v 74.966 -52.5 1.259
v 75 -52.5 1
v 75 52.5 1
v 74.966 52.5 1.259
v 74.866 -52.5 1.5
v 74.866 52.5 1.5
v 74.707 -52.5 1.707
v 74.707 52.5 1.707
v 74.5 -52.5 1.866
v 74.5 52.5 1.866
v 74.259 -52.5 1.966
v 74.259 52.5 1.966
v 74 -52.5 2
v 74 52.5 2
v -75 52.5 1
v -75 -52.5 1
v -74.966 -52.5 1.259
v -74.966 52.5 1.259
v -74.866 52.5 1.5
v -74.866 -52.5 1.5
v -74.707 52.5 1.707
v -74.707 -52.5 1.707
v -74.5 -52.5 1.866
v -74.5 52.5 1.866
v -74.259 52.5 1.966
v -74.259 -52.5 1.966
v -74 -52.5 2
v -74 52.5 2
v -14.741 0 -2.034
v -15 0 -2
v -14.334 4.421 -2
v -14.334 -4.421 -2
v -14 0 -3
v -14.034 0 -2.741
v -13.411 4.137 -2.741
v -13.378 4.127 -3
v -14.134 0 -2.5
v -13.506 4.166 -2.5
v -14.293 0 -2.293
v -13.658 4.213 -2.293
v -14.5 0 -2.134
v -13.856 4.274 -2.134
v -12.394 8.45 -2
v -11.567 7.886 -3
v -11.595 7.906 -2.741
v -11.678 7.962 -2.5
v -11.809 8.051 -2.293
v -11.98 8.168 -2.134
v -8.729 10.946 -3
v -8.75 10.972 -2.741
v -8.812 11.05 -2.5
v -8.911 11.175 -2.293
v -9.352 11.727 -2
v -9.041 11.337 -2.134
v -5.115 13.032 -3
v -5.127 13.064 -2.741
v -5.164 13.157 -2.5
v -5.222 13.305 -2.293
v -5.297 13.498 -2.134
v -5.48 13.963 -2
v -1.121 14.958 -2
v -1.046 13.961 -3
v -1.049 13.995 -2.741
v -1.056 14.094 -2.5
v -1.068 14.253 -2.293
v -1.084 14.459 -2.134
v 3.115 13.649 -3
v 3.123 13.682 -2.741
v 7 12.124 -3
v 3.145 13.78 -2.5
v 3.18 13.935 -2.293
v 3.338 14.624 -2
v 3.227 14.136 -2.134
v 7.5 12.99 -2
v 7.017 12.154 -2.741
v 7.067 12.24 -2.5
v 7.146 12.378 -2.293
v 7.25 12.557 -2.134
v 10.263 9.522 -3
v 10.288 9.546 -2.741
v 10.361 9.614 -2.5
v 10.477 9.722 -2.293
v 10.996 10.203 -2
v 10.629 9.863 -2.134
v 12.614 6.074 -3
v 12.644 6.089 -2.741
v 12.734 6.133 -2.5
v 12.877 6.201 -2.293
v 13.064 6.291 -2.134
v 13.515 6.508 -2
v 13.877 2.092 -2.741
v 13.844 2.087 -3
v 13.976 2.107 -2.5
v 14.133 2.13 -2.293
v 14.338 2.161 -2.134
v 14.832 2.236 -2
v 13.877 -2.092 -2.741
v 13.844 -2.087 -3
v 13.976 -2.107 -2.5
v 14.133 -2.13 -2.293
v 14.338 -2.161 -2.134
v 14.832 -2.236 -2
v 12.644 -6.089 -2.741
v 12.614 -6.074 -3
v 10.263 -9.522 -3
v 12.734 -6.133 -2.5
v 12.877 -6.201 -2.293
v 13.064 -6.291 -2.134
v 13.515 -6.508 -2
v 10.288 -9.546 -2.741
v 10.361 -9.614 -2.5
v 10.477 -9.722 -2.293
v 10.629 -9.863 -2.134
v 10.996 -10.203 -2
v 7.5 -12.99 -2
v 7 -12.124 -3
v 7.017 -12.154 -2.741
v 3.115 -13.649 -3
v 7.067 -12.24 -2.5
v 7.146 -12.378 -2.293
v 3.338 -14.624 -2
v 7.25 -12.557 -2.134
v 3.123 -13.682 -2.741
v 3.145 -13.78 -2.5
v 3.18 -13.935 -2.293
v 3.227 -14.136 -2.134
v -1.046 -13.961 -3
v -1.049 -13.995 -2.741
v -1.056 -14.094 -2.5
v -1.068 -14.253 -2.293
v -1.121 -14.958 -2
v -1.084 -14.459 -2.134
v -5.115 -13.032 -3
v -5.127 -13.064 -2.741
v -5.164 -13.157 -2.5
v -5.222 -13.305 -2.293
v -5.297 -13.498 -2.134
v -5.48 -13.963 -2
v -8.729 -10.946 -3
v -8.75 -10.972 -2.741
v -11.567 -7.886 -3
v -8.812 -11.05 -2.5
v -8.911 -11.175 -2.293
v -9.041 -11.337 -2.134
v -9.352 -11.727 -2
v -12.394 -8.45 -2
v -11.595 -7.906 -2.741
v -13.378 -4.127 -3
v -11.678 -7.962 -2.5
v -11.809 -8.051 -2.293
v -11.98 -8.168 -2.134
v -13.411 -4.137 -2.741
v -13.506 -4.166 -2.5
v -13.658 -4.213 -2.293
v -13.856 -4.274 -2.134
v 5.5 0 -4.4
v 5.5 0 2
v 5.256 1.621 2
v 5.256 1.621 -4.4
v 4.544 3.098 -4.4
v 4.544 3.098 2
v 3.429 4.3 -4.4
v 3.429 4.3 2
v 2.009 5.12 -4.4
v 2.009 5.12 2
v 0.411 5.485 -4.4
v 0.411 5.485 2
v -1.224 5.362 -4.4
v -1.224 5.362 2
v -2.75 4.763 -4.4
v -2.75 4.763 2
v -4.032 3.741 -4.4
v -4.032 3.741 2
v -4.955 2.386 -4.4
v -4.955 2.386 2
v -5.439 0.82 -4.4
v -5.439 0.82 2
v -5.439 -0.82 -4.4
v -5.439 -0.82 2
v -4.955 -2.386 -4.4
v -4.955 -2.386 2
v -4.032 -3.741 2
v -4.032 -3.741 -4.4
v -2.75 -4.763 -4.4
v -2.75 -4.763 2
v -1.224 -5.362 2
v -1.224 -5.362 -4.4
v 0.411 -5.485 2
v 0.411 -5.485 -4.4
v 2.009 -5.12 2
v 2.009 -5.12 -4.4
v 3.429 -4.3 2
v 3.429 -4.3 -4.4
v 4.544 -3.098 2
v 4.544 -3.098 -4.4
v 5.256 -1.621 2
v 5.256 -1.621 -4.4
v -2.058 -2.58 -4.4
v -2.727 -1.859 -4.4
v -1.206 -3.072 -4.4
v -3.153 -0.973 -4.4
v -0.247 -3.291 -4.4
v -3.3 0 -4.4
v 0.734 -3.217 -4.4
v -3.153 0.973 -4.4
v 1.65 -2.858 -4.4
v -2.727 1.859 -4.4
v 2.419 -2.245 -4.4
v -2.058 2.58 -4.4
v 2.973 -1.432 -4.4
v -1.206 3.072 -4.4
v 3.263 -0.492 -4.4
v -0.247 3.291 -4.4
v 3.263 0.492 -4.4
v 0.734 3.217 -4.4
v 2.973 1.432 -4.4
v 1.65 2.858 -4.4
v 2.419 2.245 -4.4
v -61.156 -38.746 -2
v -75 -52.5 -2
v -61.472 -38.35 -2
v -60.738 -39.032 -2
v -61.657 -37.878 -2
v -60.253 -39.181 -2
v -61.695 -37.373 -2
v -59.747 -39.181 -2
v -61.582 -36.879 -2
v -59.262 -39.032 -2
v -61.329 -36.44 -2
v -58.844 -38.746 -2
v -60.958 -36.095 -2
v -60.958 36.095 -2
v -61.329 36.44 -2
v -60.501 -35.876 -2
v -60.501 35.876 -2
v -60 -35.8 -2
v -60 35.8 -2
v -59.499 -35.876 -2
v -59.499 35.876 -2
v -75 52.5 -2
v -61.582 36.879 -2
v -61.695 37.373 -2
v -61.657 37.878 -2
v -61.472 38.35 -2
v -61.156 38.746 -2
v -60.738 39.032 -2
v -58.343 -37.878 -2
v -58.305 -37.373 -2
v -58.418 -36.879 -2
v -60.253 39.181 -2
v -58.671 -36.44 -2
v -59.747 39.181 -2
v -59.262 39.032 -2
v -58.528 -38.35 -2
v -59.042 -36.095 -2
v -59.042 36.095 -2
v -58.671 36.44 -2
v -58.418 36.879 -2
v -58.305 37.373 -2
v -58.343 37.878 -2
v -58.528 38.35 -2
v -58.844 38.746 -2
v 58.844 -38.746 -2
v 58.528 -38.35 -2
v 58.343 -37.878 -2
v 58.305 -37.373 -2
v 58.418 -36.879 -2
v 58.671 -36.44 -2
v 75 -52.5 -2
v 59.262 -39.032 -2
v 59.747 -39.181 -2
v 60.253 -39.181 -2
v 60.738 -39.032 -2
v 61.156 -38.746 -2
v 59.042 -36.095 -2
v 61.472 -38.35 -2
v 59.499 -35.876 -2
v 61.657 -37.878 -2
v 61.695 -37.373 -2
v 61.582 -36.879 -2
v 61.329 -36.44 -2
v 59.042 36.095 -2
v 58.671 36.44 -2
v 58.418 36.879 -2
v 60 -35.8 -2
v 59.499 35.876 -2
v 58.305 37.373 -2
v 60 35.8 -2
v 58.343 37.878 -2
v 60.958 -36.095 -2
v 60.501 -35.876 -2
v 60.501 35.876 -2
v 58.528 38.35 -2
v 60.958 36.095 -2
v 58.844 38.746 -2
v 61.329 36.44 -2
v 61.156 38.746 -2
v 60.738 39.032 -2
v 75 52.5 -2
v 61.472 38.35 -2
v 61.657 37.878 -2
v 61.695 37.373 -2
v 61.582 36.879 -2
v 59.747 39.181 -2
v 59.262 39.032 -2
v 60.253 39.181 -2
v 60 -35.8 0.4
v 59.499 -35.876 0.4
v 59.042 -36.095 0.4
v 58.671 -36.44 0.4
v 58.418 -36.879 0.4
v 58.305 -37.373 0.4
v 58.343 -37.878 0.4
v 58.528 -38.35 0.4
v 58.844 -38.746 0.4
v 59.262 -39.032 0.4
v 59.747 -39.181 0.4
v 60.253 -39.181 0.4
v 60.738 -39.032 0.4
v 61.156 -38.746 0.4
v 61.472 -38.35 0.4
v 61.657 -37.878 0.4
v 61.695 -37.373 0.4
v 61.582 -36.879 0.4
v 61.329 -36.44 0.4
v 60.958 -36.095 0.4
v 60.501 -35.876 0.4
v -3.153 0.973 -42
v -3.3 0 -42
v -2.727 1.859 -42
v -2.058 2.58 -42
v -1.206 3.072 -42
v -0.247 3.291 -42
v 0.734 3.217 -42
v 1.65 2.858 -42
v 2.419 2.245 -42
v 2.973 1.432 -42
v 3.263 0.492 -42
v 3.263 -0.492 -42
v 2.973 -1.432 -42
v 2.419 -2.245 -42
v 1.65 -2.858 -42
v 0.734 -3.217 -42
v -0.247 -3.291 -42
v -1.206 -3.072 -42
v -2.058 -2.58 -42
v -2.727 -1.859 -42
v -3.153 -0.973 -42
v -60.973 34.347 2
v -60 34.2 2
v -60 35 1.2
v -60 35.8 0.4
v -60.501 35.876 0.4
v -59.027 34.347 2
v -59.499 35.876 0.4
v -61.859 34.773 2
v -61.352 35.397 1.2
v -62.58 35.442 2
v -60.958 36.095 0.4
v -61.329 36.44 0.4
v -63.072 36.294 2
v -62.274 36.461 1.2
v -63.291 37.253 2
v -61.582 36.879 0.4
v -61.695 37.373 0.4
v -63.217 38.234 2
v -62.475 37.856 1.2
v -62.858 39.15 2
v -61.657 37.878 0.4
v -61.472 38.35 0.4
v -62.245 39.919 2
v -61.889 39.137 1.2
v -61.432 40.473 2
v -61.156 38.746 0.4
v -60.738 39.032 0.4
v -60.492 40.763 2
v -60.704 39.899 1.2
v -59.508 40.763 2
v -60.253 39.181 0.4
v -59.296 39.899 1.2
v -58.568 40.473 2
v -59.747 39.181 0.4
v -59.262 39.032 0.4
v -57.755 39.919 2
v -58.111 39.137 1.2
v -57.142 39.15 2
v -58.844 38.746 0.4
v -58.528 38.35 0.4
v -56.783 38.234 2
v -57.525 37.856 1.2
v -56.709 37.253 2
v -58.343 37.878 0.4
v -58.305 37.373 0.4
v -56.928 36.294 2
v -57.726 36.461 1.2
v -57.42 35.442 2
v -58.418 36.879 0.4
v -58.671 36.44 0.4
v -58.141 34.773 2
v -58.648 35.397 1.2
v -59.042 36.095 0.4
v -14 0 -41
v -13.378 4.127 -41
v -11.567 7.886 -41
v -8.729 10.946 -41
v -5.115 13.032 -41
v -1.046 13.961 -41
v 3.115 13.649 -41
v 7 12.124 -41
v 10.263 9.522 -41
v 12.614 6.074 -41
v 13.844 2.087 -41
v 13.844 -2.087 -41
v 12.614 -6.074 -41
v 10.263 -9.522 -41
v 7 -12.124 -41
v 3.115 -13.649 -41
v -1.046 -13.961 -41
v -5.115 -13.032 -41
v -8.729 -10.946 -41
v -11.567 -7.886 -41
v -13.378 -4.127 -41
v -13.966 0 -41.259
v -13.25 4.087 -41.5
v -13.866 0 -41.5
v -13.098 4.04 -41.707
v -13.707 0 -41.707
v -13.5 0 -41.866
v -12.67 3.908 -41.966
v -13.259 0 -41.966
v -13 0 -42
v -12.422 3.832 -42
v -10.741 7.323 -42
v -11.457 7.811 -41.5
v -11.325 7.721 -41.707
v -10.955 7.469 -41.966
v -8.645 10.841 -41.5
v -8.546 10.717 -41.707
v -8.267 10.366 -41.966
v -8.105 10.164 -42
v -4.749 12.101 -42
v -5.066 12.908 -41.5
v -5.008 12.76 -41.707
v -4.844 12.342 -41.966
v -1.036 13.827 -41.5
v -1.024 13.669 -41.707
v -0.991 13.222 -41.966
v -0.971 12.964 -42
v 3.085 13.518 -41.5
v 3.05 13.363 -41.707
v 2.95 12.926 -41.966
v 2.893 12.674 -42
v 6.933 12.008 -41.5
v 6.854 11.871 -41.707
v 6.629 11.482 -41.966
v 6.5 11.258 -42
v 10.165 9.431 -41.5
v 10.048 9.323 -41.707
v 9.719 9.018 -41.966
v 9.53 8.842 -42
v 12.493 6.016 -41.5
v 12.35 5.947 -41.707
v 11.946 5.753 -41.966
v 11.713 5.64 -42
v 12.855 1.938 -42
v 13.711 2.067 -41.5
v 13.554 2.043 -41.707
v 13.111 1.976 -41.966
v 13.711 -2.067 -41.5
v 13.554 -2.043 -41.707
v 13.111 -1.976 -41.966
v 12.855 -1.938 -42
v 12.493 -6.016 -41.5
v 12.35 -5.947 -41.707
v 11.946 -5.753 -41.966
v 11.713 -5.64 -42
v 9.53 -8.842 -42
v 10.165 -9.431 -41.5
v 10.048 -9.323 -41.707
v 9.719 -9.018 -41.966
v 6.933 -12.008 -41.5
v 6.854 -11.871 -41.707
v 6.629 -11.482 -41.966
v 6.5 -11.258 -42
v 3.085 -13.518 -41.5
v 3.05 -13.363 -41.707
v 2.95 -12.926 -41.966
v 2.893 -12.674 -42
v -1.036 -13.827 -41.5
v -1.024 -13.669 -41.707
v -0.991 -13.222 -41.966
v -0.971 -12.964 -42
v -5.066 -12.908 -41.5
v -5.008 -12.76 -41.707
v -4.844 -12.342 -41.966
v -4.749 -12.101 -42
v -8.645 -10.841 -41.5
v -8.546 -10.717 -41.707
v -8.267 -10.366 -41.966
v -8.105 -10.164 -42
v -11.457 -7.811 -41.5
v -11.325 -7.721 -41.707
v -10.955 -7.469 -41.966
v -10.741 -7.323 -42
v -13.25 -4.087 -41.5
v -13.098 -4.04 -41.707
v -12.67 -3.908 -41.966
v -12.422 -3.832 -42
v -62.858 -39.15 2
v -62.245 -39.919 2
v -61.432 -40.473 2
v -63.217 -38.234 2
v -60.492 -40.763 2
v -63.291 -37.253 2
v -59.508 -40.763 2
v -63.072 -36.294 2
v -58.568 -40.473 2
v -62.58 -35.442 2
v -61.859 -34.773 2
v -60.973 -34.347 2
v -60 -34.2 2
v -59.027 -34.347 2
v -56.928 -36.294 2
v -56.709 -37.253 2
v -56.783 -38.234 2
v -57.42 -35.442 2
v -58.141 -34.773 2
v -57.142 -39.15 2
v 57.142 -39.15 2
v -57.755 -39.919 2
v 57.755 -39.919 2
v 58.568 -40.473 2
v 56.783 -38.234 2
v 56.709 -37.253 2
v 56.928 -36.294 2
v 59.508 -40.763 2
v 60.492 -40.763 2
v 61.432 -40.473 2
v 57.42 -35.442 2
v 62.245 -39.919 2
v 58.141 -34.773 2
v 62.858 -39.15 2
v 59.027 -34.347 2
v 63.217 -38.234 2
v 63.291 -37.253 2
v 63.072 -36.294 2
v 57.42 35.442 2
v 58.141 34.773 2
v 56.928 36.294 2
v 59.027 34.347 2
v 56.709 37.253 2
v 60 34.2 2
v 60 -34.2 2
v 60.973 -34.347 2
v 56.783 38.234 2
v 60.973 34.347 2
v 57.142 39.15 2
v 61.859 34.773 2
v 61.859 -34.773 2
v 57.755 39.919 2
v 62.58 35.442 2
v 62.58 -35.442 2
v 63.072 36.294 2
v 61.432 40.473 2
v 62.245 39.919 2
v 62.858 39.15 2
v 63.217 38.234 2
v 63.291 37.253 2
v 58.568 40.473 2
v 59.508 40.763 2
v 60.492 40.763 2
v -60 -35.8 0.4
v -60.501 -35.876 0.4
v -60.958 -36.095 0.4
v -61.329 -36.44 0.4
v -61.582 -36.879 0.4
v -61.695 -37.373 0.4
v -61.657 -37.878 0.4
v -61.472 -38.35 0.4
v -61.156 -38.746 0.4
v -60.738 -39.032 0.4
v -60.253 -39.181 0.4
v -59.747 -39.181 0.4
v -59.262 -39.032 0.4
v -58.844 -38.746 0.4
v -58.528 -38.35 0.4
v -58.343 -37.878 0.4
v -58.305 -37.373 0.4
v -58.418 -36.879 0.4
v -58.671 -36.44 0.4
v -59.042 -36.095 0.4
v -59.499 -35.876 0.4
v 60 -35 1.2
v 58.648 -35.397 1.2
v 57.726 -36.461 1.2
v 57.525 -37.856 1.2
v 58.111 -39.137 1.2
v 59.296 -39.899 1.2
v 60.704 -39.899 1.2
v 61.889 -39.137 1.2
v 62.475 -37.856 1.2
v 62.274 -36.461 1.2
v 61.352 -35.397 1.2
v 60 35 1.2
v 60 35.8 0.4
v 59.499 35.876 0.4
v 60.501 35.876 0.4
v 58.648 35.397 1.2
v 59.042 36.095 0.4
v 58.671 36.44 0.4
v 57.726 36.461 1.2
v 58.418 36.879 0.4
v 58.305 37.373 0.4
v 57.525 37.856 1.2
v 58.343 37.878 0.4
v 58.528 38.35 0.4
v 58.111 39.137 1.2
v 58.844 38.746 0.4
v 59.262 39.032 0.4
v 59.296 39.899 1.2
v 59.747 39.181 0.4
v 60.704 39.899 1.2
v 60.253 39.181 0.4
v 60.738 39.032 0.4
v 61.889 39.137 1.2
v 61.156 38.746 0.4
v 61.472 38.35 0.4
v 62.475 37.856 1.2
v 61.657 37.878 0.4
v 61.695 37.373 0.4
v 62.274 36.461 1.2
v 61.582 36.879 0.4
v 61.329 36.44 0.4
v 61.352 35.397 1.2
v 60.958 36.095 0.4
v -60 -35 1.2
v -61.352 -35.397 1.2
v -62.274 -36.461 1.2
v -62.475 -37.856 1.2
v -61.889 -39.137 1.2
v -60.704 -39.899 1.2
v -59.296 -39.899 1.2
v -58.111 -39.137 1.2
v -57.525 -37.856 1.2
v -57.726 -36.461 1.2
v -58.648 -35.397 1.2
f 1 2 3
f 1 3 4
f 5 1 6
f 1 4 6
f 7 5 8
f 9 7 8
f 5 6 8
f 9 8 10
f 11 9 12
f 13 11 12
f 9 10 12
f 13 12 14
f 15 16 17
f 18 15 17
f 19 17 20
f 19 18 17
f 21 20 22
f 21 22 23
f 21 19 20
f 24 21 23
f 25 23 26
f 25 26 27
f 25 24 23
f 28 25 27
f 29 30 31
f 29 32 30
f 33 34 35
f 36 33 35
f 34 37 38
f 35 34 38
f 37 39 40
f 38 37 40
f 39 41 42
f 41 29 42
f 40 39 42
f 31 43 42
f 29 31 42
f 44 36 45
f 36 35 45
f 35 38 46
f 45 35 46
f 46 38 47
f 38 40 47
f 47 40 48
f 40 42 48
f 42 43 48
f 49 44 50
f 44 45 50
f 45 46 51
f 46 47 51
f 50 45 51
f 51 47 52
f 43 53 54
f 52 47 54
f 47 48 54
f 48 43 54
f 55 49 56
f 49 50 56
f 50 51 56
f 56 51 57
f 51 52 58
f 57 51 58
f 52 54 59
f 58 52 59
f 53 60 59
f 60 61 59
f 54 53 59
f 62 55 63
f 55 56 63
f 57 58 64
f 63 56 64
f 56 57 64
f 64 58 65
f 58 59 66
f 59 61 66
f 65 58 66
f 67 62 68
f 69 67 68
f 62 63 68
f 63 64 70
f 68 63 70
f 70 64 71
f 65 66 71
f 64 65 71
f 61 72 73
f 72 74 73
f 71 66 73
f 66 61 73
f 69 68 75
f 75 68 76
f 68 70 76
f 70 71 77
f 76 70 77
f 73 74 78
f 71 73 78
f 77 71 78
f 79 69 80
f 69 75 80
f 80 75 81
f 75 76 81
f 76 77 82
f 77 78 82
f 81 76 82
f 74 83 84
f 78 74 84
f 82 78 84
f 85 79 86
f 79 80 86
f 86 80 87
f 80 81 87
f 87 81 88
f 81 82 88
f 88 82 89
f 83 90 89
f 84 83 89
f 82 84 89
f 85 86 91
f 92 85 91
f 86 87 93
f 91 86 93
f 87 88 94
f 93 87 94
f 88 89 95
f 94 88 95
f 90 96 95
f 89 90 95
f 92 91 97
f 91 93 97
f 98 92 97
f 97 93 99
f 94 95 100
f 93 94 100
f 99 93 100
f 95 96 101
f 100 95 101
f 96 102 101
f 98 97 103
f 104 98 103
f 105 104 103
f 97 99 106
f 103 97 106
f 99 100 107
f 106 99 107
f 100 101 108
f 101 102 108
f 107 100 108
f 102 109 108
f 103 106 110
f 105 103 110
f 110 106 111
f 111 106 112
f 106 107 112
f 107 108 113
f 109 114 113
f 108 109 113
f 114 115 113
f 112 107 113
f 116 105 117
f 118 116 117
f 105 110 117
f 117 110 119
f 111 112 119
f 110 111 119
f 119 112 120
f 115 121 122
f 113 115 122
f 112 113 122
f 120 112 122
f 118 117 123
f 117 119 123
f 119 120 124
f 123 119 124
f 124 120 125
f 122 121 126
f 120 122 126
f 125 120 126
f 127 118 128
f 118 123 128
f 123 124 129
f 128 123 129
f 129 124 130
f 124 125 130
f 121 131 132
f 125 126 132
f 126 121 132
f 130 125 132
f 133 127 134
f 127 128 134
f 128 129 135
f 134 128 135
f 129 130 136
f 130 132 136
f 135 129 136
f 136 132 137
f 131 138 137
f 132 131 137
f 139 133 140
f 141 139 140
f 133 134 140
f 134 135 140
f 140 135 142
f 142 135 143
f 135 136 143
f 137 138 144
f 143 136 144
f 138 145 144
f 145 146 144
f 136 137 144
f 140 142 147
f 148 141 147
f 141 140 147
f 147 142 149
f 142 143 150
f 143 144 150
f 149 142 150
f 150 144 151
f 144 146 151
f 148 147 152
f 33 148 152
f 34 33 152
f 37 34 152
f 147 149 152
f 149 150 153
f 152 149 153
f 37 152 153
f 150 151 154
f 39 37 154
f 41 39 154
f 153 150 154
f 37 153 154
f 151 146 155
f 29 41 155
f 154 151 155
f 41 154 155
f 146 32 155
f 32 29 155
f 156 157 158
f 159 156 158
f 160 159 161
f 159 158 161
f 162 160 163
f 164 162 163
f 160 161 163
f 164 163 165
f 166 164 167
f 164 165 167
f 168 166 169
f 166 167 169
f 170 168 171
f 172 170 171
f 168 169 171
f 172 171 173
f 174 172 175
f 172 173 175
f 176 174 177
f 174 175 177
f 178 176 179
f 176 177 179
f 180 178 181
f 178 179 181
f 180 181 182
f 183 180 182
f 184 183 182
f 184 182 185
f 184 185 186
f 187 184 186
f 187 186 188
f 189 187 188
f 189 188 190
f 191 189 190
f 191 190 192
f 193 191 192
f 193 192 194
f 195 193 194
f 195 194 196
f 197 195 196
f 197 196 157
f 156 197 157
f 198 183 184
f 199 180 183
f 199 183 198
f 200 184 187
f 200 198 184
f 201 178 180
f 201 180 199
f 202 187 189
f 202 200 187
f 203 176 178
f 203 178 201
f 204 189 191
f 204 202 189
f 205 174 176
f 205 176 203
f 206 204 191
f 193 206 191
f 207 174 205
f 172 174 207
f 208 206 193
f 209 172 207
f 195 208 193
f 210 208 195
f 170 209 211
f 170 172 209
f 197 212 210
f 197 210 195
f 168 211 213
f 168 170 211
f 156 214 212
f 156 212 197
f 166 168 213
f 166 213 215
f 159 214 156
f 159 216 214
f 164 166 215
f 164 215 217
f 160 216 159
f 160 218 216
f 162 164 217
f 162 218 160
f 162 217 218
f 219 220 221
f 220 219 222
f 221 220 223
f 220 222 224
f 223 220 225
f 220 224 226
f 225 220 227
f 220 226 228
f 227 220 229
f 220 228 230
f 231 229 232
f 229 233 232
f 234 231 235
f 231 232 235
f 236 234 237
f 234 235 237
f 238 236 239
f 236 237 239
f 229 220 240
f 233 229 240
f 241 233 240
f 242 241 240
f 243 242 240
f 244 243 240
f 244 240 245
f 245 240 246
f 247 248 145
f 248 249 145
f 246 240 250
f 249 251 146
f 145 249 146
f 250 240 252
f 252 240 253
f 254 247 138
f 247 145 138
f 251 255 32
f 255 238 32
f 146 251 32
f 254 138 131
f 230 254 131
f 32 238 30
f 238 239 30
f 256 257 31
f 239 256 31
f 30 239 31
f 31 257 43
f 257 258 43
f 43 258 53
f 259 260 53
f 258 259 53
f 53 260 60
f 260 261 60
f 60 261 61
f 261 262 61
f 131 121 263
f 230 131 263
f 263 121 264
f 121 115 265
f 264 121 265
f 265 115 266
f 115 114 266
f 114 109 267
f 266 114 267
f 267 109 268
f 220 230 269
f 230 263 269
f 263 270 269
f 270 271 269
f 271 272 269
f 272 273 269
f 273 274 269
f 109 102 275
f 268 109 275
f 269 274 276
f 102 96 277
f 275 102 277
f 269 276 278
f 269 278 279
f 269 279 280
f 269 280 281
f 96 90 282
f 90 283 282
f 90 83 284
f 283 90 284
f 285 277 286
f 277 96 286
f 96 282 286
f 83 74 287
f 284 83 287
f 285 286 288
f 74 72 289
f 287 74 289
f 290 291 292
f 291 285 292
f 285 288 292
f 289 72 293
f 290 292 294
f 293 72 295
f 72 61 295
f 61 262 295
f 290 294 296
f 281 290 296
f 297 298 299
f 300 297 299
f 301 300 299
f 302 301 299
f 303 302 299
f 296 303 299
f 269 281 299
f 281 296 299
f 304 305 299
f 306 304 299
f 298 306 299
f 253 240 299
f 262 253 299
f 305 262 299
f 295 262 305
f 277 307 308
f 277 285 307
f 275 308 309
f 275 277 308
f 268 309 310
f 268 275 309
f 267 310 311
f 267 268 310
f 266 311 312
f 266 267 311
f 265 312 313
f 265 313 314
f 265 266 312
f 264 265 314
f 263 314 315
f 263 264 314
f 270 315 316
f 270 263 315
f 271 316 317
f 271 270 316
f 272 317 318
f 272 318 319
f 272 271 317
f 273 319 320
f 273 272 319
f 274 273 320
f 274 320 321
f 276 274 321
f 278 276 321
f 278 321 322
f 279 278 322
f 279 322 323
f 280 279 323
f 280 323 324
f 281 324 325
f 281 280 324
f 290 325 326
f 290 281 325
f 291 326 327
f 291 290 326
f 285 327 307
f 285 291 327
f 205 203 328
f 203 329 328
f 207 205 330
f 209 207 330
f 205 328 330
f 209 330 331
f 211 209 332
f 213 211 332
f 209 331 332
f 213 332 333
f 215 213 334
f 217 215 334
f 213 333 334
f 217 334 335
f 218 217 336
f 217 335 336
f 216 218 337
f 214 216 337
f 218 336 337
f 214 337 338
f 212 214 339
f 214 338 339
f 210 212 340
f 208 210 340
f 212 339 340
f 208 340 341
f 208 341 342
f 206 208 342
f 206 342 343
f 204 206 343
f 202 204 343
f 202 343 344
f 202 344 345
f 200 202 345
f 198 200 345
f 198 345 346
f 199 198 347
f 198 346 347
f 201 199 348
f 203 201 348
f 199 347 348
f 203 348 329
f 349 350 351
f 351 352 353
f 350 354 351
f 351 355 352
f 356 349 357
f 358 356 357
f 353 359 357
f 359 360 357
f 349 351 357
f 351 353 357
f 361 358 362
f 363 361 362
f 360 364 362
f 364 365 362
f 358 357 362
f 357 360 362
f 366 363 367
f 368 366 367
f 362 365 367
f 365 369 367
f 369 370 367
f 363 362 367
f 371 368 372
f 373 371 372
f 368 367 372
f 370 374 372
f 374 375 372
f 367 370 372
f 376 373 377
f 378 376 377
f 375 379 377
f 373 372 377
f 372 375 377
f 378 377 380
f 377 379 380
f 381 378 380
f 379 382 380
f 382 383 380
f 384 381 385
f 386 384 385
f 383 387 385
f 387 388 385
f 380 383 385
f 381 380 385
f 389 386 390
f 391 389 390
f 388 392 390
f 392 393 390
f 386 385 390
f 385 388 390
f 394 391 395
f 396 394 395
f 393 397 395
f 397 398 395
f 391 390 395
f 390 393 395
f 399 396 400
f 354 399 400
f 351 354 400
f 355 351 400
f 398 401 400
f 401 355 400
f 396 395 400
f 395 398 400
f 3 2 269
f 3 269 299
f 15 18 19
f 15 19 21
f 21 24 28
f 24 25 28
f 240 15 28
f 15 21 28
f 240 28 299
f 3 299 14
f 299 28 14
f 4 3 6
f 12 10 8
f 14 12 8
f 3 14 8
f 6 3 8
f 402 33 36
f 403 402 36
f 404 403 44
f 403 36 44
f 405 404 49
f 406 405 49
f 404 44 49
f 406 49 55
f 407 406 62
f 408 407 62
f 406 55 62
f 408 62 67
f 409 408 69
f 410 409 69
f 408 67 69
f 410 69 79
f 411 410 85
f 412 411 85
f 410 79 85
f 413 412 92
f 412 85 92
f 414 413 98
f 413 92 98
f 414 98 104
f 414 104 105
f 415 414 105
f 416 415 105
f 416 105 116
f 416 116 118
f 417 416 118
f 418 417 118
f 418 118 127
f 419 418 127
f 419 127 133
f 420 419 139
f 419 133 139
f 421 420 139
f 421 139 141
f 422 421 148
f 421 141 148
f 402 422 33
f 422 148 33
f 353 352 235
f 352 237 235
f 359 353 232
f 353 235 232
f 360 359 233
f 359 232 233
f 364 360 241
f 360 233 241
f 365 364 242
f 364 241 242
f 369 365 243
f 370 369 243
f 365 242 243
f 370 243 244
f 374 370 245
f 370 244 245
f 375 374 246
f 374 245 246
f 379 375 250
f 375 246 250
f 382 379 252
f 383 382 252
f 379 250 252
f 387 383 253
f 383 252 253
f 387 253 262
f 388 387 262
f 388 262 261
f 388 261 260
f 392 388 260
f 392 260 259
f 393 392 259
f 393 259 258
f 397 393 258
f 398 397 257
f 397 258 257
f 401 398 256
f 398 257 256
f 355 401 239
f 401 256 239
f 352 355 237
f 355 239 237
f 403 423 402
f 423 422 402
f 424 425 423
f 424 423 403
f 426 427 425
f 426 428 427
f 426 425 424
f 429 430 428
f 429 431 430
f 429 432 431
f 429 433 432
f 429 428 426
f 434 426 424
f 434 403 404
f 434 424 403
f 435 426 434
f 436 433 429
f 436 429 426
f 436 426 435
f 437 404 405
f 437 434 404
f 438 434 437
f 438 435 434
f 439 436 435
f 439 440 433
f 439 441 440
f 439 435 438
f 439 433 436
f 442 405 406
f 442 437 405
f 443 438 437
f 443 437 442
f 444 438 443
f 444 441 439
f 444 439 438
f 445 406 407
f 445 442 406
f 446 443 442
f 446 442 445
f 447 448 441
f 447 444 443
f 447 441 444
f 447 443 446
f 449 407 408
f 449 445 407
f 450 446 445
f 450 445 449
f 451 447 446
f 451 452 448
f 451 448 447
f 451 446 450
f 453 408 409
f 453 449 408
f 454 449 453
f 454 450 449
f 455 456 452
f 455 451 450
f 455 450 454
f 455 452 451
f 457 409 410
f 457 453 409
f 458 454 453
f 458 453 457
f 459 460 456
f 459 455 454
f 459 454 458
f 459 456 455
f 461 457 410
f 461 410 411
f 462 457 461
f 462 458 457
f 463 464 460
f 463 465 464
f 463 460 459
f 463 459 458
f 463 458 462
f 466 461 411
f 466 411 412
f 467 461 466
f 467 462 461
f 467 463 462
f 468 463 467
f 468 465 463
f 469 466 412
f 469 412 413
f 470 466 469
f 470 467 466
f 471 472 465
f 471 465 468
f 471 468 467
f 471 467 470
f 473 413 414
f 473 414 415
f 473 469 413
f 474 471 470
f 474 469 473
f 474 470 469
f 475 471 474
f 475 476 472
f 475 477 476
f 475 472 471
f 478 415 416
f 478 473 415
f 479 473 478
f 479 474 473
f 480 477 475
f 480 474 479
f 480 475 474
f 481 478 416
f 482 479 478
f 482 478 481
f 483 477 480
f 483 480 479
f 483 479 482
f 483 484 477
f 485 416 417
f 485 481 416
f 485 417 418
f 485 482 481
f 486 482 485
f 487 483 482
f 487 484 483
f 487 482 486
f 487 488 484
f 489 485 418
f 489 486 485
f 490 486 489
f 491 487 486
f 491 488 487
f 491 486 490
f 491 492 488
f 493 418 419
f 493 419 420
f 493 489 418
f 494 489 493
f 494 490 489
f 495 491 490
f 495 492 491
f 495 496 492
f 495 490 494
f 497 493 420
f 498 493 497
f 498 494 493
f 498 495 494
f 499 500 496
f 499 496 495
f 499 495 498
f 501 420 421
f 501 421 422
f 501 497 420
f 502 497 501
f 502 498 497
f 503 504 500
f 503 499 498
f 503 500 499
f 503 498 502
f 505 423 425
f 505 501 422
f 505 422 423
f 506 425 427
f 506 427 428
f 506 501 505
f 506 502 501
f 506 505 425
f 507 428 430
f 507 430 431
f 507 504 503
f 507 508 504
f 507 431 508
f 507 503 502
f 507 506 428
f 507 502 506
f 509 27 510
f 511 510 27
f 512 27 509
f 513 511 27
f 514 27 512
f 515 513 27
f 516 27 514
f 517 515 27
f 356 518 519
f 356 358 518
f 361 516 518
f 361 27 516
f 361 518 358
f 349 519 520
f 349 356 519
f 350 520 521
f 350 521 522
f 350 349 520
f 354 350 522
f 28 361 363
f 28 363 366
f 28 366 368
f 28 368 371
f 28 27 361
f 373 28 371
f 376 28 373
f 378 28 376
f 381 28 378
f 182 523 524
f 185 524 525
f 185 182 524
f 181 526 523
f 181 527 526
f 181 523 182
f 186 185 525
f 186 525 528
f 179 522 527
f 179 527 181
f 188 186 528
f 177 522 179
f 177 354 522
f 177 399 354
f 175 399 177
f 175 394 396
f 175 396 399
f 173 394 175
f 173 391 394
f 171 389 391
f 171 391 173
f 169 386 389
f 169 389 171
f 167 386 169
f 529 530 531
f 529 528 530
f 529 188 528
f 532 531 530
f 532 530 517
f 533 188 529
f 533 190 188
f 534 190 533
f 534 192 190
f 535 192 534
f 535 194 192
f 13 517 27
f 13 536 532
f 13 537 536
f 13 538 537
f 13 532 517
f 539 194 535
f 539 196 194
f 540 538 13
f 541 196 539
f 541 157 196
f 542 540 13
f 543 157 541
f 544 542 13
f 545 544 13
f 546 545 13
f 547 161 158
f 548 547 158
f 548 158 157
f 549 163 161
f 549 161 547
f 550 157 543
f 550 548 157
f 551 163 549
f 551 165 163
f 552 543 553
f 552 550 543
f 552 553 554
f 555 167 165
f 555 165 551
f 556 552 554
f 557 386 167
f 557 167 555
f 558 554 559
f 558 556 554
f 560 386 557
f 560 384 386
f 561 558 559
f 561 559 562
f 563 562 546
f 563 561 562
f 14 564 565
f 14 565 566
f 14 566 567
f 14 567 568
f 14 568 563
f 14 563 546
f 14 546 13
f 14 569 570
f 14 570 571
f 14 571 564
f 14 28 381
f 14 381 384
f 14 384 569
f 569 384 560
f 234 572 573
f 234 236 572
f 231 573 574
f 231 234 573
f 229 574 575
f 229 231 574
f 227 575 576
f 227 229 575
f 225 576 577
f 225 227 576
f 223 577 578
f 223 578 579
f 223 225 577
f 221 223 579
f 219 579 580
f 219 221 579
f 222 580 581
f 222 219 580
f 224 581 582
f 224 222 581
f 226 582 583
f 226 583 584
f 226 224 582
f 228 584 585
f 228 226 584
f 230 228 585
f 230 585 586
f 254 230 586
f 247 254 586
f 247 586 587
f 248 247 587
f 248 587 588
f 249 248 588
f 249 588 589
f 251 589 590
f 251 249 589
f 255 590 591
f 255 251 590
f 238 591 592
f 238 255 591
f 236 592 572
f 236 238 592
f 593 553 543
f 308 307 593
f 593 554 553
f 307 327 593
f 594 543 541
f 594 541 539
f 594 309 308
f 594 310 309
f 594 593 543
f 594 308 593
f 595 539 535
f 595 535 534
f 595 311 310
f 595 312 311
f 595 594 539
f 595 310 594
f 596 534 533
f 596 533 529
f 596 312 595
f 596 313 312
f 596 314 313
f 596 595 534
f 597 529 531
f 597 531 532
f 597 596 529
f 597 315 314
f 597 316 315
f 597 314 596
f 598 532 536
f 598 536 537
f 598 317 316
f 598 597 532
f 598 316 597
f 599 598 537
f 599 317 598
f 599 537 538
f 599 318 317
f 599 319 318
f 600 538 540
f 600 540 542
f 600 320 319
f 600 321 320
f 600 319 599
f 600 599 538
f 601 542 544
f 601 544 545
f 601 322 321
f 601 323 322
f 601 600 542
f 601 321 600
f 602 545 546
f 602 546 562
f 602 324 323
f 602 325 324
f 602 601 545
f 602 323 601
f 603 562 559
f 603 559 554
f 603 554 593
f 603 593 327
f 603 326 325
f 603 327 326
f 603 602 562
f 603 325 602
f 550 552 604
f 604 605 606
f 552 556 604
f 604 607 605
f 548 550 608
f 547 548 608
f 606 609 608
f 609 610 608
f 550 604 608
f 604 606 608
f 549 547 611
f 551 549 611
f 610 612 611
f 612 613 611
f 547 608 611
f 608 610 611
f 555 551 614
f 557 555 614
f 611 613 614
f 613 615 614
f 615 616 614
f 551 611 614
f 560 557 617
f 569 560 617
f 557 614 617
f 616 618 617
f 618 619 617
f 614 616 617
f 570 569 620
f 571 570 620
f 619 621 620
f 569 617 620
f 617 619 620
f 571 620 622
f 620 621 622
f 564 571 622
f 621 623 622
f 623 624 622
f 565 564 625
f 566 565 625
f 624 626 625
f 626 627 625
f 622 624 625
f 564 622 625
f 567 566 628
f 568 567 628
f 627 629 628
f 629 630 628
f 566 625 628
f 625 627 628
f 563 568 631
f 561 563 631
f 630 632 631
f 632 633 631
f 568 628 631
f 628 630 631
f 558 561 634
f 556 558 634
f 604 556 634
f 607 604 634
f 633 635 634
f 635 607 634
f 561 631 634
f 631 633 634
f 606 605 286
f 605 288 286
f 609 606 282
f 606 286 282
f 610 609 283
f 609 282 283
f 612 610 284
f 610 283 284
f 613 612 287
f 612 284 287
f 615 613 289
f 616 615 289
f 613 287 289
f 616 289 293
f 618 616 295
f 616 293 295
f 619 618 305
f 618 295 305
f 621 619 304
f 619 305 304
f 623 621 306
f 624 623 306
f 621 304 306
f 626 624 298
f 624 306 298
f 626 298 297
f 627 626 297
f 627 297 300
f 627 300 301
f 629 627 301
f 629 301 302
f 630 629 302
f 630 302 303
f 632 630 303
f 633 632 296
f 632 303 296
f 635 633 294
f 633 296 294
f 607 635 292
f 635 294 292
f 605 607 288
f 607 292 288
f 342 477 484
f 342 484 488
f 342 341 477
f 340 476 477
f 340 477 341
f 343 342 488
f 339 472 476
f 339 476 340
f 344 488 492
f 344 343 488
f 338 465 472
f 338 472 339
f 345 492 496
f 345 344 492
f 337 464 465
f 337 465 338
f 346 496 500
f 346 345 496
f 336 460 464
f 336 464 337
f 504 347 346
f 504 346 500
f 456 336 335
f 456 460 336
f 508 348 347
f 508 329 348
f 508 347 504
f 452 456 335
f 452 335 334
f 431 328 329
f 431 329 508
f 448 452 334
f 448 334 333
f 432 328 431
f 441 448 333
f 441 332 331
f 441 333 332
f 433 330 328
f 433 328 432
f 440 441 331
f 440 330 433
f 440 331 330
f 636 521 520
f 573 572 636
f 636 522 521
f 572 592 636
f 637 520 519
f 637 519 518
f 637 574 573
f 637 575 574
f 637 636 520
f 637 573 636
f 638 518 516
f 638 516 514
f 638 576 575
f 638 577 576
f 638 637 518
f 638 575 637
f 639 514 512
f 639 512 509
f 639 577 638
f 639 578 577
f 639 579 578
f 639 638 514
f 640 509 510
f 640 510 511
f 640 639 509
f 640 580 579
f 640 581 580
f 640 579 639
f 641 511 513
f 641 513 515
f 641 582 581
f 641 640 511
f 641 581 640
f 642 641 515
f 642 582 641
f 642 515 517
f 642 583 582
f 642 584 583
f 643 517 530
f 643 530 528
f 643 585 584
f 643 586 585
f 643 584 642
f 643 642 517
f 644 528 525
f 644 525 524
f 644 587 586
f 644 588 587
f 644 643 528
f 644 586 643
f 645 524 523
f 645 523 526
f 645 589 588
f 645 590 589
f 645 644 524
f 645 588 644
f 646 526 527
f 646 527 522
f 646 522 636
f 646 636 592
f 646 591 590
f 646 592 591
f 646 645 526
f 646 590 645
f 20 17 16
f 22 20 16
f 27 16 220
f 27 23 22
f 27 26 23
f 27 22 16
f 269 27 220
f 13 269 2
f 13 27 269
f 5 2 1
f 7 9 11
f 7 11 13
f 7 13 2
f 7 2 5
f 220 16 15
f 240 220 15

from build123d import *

# Parameters (mm, degrees)
SKETCH1_W                                           = 150
SKETCH1_H                                           = 105
BOSS_EXTRUDE1_DEPTH                                 = 2
M3_CLEARANCE_HOLE1_AT_2_COUNT                       = 2
M3_CLEARANCE_HOLE1_AT_2_PITCH                       = 120
SKETCH5_R                                           = 14
BOSS_EXTRUDE2_DEPTH                                 = 40
CBORE_FOR_M6_HEX_SOCKET_HEAD_CAP_SCREW1_D           = 6.6
CBORE_FOR_M6_HEX_SOCKET_HEAD_CAP_SCREW1_CBORE_D     = 11
CBORE_FOR_M6_HEX_SOCKET_HEAD_CAP_SCREW1_CBORE_DEPTH = 6.4
FILLET1_R                                           = 1
FILLET2_R                                           = 1
FILLET3_R                                           = 1


with BuildPart() as part:
    # Sketch1 → Boss-Extrude1 (new, symmetric)
    with BuildSketch(Plane.XY):
        Rectangle(SKETCH1_W, SKETCH1_H)
    extrude(amount=BOSS_EXTRUDE1_DEPTH, both=True)

    # Sketch4 → M3 Clearance Hole1 (revolve, cut)
    with BuildSketch(Plane(origin=(60, -37.5, -2), x_dir=(0, 1, 0), z_dir=(1, 0, 0))):
        Polygon((0, 0), (0, 4), (3.3, 4), (1.7, 2.4), (1.7, 0), align=None)
    m3_clearance_hole1 = revolve(axis=Axis((60, -37.5, -8.35), (0, 0, 1)), mode=Mode.SUBTRACT)

    # M3 Clearance Hole1 at 2: M3 Clearance Hole1 ×2
    with Locations(*[(-i * M3_CLEARANCE_HOLE1_AT_2_PITCH, 0, 0) for i in range(1, M3_CLEARANCE_HOLE1_AT_2_COUNT)]):
        add(m3_clearance_hole1, mode=Mode.SUBTRACT)

    # Sketch5 → Boss-Extrude2 (add)
    with BuildSketch(Plane(origin=(0, 0, -2), x_dir=(-1, 0, 0), z_dir=(0, 0, -1))):
        Circle(SKETCH5_R)
    extrude(amount=BOSS_EXTRUDE2_DEPTH)

    # CBORE for M6 Hex Socket Head Cap Screw1 (through all)
    with Locations(Plane.XY.offset(2)):
        with Locations((0, 0)):
            CounterBoreHole(CBORE_FOR_M6_HEX_SOCKET_HEAD_CAP_SCREW1_D / 2, CBORE_FOR_M6_HEX_SOCKET_HEAD_CAP_SCREW1_CBORE_D / 2, CBORE_FOR_M6_HEX_SOCKET_HEAD_CAP_SCREW1_CBORE_DEPTH)

    # Mirror1: M3 Clearance Hole1 across plane
    add(m3_clearance_hole1.mirror(Plane.ZX), mode=Mode.SUBTRACT)

    # Mirror1 copy 1 sketch → Mirror1 copy 1 (revolve, cut)
    with BuildSketch(Plane(origin=(-60, 37.5, -2), x_dir=(0, -1, 0), z_dir=(1, 0, 0))):
        Polygon((0, 0), (0, -4), (3.3, -4), (1.7, -2.4), (1.7, 0), align=None)
    revolve(axis=Axis((-60, 37.5, -8.35), (0, 0, -1)), mode=Mode.SUBTRACT)

    # Fillet1
    fillet1_edges = [part.edges().sort_by_distance(p)[0] for p in [
        (14, 0, -42),
    ]]
    fillet(fillet1_edges, radius=FILLET1_R)

    # Fillet2
    fillet2_edges = [part.edges().sort_by_distance(p)[0] for p in [
        (14, 0, -2),
    ]]
    fillet(fillet2_edges, radius=FILLET2_R)

    # Fillet3
    fillet3_edges = [part.edges().sort_by_distance(p)[0] for p in [
        (75, 0, 2),
        (-75, 0, 2),
    ]]
    fillet(fillet3_edges, radius=FILLET3_R)


solid = part.part
